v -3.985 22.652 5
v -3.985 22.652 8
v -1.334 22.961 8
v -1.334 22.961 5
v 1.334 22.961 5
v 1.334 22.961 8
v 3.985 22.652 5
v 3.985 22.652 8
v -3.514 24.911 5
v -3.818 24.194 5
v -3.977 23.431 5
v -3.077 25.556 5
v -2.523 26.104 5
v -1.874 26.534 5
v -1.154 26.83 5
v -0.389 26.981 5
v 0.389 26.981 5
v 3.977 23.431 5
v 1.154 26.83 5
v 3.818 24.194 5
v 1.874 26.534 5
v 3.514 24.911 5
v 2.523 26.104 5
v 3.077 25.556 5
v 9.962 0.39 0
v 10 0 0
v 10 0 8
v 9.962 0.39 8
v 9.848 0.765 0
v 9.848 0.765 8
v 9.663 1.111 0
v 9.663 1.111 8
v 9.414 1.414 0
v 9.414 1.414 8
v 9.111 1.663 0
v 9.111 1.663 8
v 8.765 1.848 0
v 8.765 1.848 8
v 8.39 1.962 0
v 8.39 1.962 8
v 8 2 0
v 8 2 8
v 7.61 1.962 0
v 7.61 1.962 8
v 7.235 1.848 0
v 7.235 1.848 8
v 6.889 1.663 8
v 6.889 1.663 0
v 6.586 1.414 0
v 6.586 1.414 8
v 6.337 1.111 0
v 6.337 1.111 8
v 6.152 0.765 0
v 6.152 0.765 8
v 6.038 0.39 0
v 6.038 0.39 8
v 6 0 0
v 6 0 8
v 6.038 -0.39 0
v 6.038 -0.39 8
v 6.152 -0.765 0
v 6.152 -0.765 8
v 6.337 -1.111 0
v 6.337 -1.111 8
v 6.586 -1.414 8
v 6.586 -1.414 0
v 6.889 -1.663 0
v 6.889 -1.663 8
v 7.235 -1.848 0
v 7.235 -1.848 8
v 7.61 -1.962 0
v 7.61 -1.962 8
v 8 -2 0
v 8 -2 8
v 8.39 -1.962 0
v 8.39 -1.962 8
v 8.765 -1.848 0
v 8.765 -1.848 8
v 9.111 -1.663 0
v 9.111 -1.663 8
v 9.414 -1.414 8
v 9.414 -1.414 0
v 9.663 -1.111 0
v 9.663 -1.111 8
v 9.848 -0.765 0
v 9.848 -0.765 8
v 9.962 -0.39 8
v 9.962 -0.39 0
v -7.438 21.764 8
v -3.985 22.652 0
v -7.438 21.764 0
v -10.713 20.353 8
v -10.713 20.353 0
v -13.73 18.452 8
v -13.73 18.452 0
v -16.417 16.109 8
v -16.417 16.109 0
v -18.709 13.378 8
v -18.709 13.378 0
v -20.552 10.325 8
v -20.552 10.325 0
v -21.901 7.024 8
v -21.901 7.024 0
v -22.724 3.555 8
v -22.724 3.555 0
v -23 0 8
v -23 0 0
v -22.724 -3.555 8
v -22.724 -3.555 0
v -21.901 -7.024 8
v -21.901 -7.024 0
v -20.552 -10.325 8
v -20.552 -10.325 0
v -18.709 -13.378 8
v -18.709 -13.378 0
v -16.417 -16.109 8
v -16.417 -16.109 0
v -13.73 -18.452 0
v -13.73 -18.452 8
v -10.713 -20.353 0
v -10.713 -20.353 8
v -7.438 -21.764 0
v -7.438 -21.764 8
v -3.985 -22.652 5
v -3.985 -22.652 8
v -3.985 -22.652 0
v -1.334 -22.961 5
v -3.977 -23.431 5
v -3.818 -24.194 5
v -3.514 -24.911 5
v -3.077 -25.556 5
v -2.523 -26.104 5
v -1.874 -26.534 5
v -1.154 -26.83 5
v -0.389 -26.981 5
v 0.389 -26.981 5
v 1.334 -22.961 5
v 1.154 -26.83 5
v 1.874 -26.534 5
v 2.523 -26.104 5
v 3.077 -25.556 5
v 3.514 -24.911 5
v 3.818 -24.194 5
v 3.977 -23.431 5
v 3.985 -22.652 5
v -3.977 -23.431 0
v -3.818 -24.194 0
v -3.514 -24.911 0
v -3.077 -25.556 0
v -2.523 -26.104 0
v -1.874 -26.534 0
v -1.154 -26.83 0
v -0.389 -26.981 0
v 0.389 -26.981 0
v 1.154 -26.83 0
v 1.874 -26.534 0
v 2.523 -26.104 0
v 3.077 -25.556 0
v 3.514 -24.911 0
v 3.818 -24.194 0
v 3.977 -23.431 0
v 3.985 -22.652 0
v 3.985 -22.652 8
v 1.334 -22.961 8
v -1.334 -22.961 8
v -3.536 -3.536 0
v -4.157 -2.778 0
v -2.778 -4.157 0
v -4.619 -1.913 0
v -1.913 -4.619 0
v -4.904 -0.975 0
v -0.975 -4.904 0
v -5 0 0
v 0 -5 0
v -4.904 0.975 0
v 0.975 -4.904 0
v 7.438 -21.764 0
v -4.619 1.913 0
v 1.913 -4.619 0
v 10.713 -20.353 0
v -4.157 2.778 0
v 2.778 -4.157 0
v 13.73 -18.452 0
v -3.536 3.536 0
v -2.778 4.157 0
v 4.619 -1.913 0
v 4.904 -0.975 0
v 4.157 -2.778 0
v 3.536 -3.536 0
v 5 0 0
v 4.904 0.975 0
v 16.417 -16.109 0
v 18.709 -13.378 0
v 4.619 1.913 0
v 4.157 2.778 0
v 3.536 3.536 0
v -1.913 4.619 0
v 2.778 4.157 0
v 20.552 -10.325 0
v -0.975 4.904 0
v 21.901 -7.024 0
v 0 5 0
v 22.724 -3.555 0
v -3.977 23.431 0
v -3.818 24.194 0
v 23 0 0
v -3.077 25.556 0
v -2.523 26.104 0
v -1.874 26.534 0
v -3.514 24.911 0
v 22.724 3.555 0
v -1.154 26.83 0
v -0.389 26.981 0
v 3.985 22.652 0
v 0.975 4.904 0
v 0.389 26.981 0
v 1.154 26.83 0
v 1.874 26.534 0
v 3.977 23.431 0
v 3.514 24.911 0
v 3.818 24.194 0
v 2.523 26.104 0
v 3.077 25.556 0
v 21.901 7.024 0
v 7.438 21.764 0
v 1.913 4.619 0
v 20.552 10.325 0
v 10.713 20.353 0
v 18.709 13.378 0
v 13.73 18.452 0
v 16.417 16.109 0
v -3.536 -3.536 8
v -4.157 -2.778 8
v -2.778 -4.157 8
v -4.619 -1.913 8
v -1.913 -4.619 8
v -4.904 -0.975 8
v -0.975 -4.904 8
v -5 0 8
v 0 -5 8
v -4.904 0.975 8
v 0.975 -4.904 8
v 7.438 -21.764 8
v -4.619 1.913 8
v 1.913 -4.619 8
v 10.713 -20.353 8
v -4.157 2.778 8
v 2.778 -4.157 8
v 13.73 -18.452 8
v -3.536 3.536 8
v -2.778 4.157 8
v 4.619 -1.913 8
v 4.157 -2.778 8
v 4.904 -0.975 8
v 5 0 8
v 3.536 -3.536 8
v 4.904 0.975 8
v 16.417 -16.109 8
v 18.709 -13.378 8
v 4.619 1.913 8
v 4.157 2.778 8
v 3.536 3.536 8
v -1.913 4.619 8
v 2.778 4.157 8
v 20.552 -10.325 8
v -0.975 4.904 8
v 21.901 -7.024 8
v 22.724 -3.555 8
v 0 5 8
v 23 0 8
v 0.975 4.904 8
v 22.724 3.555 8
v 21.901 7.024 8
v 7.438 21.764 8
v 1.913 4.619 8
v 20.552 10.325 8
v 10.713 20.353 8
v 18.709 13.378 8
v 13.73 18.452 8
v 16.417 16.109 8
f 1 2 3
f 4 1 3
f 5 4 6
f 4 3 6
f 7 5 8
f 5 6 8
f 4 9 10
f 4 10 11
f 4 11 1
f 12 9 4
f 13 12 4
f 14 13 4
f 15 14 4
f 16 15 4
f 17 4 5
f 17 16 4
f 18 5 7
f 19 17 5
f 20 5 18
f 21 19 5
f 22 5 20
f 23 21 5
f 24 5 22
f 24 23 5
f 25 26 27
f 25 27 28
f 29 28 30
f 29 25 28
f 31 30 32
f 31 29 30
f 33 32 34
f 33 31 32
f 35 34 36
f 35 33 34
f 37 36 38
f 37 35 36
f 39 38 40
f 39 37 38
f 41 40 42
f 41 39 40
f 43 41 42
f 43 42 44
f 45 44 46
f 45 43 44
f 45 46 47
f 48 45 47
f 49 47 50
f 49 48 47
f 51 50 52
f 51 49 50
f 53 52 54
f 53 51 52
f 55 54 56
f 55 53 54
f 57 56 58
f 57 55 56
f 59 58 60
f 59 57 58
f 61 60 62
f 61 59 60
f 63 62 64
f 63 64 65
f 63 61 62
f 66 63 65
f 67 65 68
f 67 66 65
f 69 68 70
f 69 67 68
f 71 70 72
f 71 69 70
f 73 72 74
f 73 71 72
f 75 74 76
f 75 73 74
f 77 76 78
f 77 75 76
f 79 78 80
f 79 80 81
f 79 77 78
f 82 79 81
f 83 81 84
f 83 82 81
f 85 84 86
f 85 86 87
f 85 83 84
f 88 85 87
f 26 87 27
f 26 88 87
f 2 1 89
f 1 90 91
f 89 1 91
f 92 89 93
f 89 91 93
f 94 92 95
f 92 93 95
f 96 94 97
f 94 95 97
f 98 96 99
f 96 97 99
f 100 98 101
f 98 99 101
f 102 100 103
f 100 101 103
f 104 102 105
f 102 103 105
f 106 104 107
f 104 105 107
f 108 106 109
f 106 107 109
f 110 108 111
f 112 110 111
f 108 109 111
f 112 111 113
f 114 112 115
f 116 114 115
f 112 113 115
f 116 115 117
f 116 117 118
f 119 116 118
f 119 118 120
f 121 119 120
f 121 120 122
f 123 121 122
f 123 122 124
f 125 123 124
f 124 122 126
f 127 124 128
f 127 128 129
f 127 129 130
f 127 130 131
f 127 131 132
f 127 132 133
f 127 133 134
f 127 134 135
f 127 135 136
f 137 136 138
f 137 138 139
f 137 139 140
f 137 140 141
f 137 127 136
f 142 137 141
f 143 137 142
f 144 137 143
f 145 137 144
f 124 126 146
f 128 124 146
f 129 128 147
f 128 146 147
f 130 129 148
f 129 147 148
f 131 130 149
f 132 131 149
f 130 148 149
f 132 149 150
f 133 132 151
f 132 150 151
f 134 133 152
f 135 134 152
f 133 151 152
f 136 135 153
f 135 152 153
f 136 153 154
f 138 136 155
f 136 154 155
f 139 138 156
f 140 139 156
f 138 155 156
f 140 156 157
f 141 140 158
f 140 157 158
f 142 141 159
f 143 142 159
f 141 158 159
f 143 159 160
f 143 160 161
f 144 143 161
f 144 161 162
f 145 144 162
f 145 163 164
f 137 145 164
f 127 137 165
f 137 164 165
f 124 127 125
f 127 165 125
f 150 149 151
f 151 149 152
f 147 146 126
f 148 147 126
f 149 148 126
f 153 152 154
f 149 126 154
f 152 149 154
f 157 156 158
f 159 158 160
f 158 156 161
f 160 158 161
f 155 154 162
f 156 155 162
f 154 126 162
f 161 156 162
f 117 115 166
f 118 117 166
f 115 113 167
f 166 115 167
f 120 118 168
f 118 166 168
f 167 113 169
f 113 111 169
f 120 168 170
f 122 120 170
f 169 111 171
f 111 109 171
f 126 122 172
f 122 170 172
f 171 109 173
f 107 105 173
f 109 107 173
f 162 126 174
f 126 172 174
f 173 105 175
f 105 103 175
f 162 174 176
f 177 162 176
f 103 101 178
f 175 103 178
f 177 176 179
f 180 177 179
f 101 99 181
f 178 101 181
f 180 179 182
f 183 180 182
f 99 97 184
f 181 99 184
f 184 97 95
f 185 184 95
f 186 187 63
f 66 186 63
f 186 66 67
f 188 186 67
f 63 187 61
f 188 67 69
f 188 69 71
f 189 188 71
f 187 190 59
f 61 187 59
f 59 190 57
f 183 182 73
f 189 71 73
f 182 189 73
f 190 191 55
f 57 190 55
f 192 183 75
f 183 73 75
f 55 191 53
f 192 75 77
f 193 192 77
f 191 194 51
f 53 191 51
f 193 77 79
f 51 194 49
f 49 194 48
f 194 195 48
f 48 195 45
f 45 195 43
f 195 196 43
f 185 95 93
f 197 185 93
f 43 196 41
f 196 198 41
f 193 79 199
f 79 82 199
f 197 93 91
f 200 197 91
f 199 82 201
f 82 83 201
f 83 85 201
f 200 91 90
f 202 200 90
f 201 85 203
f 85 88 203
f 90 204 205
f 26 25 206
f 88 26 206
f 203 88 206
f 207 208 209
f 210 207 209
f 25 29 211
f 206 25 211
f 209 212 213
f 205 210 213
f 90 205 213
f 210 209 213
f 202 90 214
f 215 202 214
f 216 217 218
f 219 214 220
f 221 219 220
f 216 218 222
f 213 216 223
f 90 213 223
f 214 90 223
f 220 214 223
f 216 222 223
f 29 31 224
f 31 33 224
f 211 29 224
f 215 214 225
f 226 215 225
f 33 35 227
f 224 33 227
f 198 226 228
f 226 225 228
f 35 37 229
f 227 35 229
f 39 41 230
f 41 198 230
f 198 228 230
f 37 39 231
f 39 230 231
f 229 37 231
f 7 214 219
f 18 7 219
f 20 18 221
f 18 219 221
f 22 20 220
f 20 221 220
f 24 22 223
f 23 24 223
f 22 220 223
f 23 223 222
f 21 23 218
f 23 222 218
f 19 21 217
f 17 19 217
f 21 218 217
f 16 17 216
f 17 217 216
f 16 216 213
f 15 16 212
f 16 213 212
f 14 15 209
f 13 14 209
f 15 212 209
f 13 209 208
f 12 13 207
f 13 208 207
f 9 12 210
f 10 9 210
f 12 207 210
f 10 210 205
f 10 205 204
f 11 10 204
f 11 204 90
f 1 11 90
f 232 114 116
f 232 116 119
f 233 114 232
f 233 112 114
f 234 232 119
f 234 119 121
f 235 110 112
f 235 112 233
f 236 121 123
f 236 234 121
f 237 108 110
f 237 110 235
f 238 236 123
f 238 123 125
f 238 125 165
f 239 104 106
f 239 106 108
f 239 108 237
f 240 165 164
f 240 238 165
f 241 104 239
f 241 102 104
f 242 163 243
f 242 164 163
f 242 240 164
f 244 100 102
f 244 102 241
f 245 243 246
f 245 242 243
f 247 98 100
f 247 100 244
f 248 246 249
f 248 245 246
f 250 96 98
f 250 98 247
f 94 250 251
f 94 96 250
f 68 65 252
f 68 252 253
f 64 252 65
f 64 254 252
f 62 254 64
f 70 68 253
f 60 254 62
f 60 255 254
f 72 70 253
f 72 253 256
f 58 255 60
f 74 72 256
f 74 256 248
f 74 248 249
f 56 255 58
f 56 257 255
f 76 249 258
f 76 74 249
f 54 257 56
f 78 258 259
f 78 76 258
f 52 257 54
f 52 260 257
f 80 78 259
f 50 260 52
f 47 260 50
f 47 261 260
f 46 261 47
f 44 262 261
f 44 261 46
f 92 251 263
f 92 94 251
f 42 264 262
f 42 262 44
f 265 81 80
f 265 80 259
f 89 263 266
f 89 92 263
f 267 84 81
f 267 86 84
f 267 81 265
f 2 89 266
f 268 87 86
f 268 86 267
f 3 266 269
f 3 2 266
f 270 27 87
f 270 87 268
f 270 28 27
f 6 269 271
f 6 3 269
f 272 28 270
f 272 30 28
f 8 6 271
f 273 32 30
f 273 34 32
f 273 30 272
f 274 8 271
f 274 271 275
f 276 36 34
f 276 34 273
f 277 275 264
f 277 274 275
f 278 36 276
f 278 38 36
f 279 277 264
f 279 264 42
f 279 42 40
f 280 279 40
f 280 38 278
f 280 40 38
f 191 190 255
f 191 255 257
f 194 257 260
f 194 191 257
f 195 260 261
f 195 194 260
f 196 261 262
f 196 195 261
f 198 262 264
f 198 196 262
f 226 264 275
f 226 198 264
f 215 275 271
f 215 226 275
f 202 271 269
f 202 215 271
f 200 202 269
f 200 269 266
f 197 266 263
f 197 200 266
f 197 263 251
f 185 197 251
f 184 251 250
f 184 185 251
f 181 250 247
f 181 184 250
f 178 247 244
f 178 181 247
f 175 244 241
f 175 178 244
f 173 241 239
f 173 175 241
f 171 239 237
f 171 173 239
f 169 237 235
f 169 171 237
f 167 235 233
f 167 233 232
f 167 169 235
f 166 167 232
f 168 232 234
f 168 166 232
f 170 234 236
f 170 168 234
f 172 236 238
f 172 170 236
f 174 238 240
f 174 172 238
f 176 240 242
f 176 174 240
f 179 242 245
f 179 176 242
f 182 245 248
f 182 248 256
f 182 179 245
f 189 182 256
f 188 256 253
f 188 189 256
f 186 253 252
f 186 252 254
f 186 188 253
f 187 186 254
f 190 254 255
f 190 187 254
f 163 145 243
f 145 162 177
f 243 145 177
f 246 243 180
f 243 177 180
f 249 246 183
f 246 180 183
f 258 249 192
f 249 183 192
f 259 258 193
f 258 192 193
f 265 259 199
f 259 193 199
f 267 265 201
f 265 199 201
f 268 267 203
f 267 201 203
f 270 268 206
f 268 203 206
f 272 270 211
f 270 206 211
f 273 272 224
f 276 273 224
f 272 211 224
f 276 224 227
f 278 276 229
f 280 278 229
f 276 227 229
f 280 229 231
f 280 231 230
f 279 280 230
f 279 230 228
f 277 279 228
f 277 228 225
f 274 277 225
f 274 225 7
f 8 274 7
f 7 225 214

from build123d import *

# Parameters (mm, degrees)
F0_R     = 5
F0_R_2   = 2
F1_DEPTH = 8
F3_DEPTH = 3


with BuildPart() as f1:
    # F0 (on Top) → F1 (new body)
    with BuildSketch(Plane.XY):
        with BuildLine():
            ThreePointArc((3.984848, 22.652174), (0, 27), (-3.984848, 22.652174))
            ThreePointArc((-3.984848, 22.652174), (-23, 0), (-3.984848, -22.652174))
            ThreePointArc((-3.984848, -22.652174), (0, -27), (3.984848, -22.652174))
            ThreePointArc((3.984848, -22.652174), (23, 0), (3.984848, 22.652174))
        make_face()
        Circle(F0_R, mode=Mode.SUBTRACT)
        with Locations((8, 0)):
            Circle(F0_R_2, mode=Mode.SUBTRACT)
    extrude(amount=F1_DEPTH)

    # F2 (on face) → F3 (cut)
    with BuildSketch(Plane.XY.offset(8)):
        with BuildLine():
            ThreePointArc((-3.984848, 22.652174), (0, 23), (3.984848, 22.652174))
            ThreePointArc((3.984848, 22.652174), (0, 27), (-3.984848, 22.652174))
        make_face()
        with BuildLine():
            ThreePointArc((-3.984848, -22.652174), (0, -27), (3.984848, -22.652174))
            ThreePointArc((3.984848, -22.652174), (0, -23), (-3.984848, -22.652174))
        make_face()
    extrude(amount=-F3_DEPTH, mode=Mode.SUBTRACT)


solid = f1.part
